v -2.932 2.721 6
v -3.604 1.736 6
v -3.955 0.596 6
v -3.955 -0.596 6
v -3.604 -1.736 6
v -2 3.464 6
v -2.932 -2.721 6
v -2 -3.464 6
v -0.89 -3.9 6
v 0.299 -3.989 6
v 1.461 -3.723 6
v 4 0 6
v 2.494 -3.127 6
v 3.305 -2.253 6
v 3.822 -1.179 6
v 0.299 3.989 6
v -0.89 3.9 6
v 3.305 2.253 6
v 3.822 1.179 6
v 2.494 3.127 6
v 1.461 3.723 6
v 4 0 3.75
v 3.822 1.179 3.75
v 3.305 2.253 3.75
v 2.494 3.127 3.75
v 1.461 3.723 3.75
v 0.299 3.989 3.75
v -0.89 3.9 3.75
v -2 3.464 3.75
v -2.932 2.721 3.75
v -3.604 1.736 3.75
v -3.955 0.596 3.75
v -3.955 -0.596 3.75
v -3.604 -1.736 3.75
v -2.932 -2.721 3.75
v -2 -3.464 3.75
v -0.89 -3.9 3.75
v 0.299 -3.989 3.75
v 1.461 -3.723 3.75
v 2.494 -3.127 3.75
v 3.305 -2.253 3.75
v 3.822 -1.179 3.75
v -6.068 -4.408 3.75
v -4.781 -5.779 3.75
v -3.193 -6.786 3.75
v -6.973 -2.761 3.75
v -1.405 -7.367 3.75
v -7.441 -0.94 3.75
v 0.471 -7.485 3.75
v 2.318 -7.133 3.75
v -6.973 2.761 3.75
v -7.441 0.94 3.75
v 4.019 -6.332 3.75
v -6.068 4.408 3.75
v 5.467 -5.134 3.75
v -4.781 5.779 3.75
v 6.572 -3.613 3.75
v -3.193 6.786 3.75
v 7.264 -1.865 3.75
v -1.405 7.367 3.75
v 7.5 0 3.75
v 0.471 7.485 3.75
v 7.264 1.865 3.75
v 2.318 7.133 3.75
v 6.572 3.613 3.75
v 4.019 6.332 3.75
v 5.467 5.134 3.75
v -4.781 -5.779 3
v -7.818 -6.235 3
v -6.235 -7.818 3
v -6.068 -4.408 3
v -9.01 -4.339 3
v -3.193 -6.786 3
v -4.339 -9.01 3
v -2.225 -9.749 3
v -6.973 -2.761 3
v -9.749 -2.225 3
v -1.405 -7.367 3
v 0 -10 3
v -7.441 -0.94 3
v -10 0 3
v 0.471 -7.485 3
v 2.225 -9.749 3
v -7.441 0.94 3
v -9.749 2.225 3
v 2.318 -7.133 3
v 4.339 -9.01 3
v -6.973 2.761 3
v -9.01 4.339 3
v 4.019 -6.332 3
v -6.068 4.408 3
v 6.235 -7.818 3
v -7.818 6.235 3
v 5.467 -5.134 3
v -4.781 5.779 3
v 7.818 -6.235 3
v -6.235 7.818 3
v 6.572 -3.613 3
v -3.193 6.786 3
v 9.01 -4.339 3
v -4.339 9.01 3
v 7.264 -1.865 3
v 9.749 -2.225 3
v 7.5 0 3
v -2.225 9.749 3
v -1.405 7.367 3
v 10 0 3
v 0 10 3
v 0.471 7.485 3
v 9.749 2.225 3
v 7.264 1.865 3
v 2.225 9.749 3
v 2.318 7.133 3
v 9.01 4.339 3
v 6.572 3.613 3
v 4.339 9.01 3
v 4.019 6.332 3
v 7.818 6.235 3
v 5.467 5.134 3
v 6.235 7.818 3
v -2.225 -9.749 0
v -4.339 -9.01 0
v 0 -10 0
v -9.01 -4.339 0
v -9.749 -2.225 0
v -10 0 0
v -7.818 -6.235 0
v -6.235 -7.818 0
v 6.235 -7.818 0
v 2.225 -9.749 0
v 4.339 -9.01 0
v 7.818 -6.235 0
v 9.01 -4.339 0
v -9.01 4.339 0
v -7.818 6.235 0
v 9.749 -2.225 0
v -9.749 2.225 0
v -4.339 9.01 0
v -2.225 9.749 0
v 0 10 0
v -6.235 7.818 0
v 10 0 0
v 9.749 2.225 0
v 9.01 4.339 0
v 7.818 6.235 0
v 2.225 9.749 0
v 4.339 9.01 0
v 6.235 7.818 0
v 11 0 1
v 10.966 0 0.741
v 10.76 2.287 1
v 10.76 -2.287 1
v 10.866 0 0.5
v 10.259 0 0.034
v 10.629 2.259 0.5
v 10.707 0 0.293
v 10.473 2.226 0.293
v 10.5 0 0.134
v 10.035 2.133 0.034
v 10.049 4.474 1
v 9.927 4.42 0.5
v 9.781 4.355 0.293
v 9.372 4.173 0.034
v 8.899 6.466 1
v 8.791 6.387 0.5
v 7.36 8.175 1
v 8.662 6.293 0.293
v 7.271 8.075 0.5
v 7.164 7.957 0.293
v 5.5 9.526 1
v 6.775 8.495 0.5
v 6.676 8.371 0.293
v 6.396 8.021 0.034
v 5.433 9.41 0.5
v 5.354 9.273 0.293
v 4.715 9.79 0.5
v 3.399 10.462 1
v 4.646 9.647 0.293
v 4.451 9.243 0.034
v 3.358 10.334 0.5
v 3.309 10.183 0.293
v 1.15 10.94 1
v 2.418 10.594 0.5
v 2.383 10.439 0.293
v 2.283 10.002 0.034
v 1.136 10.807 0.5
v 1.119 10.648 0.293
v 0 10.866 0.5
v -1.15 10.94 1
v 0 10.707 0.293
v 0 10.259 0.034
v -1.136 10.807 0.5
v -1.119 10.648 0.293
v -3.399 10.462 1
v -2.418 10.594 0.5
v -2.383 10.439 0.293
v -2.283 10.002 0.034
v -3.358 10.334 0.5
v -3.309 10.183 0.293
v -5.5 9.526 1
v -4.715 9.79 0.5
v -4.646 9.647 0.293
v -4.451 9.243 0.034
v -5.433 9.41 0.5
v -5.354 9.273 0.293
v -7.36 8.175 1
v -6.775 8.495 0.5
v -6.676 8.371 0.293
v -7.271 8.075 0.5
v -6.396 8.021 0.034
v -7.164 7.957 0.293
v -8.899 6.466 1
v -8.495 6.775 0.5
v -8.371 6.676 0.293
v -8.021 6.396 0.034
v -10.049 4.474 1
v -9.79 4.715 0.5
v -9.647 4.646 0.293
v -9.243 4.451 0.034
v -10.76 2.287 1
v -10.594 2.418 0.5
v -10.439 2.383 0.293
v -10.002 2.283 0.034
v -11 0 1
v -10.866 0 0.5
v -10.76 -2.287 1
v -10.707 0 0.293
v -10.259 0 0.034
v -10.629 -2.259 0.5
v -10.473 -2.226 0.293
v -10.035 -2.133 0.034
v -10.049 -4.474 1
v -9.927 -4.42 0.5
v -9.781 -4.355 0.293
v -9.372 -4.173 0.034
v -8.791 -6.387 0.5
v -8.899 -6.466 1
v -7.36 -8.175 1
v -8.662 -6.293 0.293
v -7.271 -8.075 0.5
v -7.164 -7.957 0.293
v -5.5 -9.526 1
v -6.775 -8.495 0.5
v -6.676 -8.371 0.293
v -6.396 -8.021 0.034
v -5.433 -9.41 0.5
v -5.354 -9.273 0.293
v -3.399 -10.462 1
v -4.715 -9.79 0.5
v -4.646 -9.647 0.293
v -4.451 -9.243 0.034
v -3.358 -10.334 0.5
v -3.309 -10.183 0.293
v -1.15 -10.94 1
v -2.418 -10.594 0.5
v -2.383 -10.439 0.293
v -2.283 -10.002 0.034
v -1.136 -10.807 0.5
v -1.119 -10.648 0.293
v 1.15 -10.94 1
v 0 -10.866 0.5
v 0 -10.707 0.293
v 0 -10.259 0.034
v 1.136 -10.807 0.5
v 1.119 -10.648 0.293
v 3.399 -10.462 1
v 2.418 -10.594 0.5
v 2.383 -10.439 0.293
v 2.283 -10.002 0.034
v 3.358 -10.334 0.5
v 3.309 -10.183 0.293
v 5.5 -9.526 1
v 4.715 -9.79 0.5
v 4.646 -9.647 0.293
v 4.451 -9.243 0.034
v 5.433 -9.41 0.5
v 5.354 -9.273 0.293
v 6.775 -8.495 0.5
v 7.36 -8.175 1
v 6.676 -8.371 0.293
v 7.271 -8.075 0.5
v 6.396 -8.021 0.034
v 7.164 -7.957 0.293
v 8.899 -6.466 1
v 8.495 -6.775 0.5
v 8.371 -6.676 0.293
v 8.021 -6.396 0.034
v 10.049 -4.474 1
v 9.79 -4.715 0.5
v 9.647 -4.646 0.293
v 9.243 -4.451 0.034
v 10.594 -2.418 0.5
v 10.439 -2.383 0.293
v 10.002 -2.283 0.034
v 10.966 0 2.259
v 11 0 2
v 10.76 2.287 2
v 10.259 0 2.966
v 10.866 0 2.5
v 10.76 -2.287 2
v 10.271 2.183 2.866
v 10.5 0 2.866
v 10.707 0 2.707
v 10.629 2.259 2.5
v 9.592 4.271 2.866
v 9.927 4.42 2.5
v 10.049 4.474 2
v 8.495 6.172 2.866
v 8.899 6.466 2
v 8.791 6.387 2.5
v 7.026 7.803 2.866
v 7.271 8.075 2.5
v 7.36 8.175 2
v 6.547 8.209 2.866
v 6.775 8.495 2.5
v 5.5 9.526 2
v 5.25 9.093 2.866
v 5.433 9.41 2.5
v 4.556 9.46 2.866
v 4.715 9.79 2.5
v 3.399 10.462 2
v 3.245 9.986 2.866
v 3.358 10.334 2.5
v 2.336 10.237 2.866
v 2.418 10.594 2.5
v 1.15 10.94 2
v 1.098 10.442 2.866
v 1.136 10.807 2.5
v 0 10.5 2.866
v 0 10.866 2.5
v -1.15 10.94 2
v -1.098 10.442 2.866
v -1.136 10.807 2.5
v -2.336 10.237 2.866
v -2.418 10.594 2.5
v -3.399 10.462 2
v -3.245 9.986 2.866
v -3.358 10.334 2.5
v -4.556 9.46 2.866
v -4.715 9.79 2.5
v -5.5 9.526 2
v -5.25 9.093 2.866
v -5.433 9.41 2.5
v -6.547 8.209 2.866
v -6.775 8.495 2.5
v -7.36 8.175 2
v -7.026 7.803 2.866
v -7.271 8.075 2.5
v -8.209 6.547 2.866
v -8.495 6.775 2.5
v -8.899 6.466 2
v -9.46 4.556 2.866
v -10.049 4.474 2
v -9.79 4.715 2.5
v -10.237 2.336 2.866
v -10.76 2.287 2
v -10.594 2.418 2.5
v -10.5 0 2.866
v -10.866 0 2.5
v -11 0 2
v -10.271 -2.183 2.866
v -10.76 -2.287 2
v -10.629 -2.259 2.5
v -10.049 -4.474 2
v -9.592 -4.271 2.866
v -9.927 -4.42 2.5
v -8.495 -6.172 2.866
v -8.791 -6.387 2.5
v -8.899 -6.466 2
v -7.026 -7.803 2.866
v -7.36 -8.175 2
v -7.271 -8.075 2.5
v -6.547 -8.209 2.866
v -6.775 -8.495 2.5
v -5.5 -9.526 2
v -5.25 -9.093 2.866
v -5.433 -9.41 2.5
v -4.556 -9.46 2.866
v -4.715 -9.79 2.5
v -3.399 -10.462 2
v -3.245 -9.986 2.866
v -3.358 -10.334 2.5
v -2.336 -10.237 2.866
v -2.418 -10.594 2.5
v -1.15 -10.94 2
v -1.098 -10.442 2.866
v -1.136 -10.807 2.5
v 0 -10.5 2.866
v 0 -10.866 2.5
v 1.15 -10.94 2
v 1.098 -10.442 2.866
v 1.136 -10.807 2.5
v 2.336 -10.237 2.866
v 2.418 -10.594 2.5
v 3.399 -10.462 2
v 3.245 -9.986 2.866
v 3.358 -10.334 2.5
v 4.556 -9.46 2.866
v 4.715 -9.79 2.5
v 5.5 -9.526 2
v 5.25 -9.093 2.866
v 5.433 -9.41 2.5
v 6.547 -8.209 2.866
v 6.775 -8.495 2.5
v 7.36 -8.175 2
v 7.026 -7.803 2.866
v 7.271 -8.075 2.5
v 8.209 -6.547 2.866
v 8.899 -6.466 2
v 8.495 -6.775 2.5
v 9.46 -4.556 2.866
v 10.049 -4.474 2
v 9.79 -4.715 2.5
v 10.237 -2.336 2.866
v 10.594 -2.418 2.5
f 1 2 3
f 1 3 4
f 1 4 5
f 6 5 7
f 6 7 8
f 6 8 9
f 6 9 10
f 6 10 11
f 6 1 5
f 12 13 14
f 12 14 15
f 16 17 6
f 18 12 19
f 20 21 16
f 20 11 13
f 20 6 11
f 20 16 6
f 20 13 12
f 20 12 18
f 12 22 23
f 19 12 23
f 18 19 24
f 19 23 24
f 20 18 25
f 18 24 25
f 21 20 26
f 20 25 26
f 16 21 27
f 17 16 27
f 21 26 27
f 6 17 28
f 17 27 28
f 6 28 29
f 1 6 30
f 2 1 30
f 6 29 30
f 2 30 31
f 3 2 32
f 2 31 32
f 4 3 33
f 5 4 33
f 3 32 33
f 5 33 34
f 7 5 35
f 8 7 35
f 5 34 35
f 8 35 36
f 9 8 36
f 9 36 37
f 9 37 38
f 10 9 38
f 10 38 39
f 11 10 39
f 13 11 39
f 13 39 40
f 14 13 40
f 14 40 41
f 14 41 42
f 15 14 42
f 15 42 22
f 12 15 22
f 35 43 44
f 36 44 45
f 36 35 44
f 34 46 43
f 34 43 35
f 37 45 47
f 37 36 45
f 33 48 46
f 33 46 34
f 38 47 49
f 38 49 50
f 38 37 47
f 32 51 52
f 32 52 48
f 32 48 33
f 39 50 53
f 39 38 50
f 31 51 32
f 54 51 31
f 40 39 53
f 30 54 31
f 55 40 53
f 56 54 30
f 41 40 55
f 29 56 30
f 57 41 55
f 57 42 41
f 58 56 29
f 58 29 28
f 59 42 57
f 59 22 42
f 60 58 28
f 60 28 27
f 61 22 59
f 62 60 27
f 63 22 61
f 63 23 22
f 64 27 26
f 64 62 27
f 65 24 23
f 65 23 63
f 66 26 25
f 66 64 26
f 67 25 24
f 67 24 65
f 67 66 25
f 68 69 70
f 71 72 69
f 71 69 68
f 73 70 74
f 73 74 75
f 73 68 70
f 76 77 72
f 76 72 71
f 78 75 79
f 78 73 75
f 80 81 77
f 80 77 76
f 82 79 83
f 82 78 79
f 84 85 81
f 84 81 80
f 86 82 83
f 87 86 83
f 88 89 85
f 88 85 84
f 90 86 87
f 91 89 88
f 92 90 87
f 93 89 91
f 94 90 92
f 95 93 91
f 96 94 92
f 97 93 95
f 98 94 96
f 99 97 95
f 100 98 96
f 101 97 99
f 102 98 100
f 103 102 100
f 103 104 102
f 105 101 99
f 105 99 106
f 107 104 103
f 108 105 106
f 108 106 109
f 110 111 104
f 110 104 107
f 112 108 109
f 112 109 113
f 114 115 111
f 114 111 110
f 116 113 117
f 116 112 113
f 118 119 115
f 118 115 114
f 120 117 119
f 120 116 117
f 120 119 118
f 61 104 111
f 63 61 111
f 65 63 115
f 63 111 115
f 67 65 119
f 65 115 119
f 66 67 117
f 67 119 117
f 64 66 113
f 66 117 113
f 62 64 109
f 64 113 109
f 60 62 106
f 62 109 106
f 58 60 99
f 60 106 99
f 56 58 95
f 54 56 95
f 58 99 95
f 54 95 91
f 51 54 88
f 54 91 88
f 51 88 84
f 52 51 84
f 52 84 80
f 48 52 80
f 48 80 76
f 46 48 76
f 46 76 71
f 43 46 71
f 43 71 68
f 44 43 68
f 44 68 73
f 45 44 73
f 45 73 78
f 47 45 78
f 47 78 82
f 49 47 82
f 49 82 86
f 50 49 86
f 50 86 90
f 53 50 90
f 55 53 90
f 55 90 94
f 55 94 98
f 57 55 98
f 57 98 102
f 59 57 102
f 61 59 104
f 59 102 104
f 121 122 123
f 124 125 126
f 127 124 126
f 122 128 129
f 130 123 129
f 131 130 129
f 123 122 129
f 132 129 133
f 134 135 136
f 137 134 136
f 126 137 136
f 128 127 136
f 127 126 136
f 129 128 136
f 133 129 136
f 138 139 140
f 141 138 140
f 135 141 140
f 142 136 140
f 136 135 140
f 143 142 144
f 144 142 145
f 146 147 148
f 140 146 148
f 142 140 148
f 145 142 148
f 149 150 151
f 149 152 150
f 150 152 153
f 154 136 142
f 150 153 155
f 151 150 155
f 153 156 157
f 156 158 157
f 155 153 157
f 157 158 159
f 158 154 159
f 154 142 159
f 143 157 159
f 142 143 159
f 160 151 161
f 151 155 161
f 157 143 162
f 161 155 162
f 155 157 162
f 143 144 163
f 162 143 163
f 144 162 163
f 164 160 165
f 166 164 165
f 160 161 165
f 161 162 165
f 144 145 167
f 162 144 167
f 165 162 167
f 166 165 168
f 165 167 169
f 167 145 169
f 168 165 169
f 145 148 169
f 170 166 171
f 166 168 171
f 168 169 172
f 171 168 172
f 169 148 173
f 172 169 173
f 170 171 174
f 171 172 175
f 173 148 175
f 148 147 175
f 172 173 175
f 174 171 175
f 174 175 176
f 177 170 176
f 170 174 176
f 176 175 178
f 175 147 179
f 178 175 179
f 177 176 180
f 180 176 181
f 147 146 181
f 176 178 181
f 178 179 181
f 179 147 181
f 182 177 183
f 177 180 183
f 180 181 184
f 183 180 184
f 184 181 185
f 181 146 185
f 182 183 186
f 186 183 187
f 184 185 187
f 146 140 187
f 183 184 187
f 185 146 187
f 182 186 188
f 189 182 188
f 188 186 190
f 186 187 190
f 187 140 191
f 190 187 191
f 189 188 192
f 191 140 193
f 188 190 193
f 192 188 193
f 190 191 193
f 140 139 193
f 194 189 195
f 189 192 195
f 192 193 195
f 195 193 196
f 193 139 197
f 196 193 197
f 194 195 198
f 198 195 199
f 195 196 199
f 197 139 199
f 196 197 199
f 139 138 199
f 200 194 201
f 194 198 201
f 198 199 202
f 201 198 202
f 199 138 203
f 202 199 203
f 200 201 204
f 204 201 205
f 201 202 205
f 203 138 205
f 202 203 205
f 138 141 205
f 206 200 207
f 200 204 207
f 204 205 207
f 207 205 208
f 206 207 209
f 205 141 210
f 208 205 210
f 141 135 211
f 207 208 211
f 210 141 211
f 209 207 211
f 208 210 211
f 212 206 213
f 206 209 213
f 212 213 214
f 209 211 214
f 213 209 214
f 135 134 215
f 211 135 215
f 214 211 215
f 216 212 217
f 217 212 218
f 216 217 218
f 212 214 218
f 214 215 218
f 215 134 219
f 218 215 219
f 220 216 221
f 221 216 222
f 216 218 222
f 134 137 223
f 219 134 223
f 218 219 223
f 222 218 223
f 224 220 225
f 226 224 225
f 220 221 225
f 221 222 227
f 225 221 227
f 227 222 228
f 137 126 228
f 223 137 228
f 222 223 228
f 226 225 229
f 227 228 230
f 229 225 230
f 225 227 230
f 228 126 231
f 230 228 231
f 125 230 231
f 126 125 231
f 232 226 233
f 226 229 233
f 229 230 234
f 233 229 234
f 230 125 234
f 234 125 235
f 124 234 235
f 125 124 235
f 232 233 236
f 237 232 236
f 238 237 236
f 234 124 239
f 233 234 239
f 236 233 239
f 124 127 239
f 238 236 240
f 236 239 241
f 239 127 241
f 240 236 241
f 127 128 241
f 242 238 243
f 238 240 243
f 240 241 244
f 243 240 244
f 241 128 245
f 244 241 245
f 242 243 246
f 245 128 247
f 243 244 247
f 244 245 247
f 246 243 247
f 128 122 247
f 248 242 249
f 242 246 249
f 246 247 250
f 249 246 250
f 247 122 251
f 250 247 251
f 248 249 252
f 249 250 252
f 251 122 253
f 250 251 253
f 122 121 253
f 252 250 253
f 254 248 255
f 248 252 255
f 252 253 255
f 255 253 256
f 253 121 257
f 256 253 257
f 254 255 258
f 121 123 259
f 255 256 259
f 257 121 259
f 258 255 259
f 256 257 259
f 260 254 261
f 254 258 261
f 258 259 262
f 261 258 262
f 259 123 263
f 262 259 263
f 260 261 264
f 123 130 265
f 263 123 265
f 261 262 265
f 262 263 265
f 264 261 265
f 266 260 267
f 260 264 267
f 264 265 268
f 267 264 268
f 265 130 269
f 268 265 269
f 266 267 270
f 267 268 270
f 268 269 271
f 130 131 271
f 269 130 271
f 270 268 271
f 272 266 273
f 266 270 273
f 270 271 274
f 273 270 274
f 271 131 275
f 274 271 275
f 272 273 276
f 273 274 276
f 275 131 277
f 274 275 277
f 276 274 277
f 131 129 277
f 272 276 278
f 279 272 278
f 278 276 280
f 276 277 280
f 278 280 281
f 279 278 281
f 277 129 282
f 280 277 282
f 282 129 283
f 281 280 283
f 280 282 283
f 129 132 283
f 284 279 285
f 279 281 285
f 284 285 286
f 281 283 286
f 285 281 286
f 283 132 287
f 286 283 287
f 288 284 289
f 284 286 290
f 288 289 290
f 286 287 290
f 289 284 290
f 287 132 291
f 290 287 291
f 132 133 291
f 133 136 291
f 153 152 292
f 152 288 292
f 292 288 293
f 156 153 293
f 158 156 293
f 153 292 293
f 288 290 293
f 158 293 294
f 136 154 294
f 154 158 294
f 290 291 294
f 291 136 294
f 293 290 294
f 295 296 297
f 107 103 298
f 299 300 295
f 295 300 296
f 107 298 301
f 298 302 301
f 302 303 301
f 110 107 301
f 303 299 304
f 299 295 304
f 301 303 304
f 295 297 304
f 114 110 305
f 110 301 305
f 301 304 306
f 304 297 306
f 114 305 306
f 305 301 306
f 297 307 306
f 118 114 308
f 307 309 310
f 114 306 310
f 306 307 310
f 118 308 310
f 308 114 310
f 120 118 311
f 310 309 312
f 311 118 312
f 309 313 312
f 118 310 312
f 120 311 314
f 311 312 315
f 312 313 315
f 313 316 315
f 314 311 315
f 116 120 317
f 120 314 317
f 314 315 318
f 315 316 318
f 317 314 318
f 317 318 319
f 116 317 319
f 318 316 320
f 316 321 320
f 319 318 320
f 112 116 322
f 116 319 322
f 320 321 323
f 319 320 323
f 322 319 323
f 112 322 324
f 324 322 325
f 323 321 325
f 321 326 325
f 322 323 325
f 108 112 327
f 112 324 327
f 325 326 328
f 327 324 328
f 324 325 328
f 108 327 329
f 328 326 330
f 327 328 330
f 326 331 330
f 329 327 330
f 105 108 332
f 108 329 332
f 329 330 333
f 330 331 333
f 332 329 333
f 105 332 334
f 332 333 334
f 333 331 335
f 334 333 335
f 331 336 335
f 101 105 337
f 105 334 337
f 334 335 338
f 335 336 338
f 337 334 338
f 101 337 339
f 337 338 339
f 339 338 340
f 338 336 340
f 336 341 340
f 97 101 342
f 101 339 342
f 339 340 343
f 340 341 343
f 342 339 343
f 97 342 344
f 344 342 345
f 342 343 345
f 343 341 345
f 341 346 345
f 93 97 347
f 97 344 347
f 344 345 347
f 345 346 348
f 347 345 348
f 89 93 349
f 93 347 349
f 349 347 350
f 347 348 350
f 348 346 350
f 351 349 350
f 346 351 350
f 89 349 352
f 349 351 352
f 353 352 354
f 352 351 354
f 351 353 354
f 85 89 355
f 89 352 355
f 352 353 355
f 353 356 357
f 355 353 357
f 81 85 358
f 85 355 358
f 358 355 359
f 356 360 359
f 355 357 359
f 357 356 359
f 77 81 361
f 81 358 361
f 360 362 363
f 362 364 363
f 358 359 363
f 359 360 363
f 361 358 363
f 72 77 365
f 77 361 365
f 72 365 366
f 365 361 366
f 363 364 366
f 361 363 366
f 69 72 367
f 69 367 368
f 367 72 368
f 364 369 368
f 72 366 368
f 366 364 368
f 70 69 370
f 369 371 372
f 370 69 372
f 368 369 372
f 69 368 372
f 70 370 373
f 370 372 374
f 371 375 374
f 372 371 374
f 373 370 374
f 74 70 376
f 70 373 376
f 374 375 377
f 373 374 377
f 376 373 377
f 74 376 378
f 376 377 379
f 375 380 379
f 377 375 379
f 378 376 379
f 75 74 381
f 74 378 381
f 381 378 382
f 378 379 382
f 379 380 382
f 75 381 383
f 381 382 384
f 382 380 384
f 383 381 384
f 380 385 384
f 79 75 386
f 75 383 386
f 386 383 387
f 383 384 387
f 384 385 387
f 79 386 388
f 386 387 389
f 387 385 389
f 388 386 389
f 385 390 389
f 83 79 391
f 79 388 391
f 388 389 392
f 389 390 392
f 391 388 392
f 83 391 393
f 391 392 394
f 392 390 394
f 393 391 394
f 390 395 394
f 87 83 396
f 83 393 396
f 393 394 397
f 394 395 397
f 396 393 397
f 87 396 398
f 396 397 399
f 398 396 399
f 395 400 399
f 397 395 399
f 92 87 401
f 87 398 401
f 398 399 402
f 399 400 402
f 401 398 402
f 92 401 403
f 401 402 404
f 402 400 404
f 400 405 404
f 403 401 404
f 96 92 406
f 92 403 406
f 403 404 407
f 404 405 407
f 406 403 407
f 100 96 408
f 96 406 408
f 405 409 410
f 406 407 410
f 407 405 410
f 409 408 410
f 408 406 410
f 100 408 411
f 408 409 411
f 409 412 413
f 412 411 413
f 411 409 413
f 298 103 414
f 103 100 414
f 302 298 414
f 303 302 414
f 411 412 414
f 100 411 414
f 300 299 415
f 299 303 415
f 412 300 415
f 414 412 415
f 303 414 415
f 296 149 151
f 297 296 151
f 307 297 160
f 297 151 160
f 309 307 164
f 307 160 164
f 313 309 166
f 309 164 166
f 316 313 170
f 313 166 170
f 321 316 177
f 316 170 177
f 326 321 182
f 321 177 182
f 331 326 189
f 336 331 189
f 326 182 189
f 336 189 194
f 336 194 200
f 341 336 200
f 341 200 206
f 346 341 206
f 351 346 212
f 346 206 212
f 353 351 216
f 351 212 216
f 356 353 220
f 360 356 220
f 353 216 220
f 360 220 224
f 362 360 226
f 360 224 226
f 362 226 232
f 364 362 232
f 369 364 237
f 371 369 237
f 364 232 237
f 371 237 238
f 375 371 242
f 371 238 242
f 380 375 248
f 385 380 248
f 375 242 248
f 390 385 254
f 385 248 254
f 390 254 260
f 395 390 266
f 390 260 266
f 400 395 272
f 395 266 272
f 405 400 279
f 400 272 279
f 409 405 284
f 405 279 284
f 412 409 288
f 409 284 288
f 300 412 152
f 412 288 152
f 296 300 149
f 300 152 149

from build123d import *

# Parameters (mm, degrees)
F0_R     = 11
F0_R_2   = 7.5
F1_DEPTH = 3
F0_R_3   = 4
F2_DEPTH = 3.75
F3_DEPTH = 6
F4_R     = 1


with BuildPart() as f1:
    # F0 (on Top) → F1 (new body)
    with BuildSketch(Plane.XY):
        Circle(F0_R)
        Circle(F0_R_2, mode=Mode.SUBTRACT)
    extrude(amount=F1_DEPTH)

    # F0 (on Top) → F2 (join)
    with BuildSketch(Plane.XY):
        Circle(F0_R_2)
        Circle(F0_R_3, mode=Mode.SUBTRACT)
    extrude(amount=F2_DEPTH)

    # F0 (on Top) → F3 (join)
    with BuildSketch(Plane.XY):
        Circle(F0_R_3)
    extrude(amount=F3_DEPTH)

    # F4
    f4_edges = [f1.edges().sort_by_distance(p)[0] for p in [
        (-11, 0, 0),
        (-11, 0, 3),
    ]]
    fillet(f4_edges, radius=F4_R)


solid = f1.part
